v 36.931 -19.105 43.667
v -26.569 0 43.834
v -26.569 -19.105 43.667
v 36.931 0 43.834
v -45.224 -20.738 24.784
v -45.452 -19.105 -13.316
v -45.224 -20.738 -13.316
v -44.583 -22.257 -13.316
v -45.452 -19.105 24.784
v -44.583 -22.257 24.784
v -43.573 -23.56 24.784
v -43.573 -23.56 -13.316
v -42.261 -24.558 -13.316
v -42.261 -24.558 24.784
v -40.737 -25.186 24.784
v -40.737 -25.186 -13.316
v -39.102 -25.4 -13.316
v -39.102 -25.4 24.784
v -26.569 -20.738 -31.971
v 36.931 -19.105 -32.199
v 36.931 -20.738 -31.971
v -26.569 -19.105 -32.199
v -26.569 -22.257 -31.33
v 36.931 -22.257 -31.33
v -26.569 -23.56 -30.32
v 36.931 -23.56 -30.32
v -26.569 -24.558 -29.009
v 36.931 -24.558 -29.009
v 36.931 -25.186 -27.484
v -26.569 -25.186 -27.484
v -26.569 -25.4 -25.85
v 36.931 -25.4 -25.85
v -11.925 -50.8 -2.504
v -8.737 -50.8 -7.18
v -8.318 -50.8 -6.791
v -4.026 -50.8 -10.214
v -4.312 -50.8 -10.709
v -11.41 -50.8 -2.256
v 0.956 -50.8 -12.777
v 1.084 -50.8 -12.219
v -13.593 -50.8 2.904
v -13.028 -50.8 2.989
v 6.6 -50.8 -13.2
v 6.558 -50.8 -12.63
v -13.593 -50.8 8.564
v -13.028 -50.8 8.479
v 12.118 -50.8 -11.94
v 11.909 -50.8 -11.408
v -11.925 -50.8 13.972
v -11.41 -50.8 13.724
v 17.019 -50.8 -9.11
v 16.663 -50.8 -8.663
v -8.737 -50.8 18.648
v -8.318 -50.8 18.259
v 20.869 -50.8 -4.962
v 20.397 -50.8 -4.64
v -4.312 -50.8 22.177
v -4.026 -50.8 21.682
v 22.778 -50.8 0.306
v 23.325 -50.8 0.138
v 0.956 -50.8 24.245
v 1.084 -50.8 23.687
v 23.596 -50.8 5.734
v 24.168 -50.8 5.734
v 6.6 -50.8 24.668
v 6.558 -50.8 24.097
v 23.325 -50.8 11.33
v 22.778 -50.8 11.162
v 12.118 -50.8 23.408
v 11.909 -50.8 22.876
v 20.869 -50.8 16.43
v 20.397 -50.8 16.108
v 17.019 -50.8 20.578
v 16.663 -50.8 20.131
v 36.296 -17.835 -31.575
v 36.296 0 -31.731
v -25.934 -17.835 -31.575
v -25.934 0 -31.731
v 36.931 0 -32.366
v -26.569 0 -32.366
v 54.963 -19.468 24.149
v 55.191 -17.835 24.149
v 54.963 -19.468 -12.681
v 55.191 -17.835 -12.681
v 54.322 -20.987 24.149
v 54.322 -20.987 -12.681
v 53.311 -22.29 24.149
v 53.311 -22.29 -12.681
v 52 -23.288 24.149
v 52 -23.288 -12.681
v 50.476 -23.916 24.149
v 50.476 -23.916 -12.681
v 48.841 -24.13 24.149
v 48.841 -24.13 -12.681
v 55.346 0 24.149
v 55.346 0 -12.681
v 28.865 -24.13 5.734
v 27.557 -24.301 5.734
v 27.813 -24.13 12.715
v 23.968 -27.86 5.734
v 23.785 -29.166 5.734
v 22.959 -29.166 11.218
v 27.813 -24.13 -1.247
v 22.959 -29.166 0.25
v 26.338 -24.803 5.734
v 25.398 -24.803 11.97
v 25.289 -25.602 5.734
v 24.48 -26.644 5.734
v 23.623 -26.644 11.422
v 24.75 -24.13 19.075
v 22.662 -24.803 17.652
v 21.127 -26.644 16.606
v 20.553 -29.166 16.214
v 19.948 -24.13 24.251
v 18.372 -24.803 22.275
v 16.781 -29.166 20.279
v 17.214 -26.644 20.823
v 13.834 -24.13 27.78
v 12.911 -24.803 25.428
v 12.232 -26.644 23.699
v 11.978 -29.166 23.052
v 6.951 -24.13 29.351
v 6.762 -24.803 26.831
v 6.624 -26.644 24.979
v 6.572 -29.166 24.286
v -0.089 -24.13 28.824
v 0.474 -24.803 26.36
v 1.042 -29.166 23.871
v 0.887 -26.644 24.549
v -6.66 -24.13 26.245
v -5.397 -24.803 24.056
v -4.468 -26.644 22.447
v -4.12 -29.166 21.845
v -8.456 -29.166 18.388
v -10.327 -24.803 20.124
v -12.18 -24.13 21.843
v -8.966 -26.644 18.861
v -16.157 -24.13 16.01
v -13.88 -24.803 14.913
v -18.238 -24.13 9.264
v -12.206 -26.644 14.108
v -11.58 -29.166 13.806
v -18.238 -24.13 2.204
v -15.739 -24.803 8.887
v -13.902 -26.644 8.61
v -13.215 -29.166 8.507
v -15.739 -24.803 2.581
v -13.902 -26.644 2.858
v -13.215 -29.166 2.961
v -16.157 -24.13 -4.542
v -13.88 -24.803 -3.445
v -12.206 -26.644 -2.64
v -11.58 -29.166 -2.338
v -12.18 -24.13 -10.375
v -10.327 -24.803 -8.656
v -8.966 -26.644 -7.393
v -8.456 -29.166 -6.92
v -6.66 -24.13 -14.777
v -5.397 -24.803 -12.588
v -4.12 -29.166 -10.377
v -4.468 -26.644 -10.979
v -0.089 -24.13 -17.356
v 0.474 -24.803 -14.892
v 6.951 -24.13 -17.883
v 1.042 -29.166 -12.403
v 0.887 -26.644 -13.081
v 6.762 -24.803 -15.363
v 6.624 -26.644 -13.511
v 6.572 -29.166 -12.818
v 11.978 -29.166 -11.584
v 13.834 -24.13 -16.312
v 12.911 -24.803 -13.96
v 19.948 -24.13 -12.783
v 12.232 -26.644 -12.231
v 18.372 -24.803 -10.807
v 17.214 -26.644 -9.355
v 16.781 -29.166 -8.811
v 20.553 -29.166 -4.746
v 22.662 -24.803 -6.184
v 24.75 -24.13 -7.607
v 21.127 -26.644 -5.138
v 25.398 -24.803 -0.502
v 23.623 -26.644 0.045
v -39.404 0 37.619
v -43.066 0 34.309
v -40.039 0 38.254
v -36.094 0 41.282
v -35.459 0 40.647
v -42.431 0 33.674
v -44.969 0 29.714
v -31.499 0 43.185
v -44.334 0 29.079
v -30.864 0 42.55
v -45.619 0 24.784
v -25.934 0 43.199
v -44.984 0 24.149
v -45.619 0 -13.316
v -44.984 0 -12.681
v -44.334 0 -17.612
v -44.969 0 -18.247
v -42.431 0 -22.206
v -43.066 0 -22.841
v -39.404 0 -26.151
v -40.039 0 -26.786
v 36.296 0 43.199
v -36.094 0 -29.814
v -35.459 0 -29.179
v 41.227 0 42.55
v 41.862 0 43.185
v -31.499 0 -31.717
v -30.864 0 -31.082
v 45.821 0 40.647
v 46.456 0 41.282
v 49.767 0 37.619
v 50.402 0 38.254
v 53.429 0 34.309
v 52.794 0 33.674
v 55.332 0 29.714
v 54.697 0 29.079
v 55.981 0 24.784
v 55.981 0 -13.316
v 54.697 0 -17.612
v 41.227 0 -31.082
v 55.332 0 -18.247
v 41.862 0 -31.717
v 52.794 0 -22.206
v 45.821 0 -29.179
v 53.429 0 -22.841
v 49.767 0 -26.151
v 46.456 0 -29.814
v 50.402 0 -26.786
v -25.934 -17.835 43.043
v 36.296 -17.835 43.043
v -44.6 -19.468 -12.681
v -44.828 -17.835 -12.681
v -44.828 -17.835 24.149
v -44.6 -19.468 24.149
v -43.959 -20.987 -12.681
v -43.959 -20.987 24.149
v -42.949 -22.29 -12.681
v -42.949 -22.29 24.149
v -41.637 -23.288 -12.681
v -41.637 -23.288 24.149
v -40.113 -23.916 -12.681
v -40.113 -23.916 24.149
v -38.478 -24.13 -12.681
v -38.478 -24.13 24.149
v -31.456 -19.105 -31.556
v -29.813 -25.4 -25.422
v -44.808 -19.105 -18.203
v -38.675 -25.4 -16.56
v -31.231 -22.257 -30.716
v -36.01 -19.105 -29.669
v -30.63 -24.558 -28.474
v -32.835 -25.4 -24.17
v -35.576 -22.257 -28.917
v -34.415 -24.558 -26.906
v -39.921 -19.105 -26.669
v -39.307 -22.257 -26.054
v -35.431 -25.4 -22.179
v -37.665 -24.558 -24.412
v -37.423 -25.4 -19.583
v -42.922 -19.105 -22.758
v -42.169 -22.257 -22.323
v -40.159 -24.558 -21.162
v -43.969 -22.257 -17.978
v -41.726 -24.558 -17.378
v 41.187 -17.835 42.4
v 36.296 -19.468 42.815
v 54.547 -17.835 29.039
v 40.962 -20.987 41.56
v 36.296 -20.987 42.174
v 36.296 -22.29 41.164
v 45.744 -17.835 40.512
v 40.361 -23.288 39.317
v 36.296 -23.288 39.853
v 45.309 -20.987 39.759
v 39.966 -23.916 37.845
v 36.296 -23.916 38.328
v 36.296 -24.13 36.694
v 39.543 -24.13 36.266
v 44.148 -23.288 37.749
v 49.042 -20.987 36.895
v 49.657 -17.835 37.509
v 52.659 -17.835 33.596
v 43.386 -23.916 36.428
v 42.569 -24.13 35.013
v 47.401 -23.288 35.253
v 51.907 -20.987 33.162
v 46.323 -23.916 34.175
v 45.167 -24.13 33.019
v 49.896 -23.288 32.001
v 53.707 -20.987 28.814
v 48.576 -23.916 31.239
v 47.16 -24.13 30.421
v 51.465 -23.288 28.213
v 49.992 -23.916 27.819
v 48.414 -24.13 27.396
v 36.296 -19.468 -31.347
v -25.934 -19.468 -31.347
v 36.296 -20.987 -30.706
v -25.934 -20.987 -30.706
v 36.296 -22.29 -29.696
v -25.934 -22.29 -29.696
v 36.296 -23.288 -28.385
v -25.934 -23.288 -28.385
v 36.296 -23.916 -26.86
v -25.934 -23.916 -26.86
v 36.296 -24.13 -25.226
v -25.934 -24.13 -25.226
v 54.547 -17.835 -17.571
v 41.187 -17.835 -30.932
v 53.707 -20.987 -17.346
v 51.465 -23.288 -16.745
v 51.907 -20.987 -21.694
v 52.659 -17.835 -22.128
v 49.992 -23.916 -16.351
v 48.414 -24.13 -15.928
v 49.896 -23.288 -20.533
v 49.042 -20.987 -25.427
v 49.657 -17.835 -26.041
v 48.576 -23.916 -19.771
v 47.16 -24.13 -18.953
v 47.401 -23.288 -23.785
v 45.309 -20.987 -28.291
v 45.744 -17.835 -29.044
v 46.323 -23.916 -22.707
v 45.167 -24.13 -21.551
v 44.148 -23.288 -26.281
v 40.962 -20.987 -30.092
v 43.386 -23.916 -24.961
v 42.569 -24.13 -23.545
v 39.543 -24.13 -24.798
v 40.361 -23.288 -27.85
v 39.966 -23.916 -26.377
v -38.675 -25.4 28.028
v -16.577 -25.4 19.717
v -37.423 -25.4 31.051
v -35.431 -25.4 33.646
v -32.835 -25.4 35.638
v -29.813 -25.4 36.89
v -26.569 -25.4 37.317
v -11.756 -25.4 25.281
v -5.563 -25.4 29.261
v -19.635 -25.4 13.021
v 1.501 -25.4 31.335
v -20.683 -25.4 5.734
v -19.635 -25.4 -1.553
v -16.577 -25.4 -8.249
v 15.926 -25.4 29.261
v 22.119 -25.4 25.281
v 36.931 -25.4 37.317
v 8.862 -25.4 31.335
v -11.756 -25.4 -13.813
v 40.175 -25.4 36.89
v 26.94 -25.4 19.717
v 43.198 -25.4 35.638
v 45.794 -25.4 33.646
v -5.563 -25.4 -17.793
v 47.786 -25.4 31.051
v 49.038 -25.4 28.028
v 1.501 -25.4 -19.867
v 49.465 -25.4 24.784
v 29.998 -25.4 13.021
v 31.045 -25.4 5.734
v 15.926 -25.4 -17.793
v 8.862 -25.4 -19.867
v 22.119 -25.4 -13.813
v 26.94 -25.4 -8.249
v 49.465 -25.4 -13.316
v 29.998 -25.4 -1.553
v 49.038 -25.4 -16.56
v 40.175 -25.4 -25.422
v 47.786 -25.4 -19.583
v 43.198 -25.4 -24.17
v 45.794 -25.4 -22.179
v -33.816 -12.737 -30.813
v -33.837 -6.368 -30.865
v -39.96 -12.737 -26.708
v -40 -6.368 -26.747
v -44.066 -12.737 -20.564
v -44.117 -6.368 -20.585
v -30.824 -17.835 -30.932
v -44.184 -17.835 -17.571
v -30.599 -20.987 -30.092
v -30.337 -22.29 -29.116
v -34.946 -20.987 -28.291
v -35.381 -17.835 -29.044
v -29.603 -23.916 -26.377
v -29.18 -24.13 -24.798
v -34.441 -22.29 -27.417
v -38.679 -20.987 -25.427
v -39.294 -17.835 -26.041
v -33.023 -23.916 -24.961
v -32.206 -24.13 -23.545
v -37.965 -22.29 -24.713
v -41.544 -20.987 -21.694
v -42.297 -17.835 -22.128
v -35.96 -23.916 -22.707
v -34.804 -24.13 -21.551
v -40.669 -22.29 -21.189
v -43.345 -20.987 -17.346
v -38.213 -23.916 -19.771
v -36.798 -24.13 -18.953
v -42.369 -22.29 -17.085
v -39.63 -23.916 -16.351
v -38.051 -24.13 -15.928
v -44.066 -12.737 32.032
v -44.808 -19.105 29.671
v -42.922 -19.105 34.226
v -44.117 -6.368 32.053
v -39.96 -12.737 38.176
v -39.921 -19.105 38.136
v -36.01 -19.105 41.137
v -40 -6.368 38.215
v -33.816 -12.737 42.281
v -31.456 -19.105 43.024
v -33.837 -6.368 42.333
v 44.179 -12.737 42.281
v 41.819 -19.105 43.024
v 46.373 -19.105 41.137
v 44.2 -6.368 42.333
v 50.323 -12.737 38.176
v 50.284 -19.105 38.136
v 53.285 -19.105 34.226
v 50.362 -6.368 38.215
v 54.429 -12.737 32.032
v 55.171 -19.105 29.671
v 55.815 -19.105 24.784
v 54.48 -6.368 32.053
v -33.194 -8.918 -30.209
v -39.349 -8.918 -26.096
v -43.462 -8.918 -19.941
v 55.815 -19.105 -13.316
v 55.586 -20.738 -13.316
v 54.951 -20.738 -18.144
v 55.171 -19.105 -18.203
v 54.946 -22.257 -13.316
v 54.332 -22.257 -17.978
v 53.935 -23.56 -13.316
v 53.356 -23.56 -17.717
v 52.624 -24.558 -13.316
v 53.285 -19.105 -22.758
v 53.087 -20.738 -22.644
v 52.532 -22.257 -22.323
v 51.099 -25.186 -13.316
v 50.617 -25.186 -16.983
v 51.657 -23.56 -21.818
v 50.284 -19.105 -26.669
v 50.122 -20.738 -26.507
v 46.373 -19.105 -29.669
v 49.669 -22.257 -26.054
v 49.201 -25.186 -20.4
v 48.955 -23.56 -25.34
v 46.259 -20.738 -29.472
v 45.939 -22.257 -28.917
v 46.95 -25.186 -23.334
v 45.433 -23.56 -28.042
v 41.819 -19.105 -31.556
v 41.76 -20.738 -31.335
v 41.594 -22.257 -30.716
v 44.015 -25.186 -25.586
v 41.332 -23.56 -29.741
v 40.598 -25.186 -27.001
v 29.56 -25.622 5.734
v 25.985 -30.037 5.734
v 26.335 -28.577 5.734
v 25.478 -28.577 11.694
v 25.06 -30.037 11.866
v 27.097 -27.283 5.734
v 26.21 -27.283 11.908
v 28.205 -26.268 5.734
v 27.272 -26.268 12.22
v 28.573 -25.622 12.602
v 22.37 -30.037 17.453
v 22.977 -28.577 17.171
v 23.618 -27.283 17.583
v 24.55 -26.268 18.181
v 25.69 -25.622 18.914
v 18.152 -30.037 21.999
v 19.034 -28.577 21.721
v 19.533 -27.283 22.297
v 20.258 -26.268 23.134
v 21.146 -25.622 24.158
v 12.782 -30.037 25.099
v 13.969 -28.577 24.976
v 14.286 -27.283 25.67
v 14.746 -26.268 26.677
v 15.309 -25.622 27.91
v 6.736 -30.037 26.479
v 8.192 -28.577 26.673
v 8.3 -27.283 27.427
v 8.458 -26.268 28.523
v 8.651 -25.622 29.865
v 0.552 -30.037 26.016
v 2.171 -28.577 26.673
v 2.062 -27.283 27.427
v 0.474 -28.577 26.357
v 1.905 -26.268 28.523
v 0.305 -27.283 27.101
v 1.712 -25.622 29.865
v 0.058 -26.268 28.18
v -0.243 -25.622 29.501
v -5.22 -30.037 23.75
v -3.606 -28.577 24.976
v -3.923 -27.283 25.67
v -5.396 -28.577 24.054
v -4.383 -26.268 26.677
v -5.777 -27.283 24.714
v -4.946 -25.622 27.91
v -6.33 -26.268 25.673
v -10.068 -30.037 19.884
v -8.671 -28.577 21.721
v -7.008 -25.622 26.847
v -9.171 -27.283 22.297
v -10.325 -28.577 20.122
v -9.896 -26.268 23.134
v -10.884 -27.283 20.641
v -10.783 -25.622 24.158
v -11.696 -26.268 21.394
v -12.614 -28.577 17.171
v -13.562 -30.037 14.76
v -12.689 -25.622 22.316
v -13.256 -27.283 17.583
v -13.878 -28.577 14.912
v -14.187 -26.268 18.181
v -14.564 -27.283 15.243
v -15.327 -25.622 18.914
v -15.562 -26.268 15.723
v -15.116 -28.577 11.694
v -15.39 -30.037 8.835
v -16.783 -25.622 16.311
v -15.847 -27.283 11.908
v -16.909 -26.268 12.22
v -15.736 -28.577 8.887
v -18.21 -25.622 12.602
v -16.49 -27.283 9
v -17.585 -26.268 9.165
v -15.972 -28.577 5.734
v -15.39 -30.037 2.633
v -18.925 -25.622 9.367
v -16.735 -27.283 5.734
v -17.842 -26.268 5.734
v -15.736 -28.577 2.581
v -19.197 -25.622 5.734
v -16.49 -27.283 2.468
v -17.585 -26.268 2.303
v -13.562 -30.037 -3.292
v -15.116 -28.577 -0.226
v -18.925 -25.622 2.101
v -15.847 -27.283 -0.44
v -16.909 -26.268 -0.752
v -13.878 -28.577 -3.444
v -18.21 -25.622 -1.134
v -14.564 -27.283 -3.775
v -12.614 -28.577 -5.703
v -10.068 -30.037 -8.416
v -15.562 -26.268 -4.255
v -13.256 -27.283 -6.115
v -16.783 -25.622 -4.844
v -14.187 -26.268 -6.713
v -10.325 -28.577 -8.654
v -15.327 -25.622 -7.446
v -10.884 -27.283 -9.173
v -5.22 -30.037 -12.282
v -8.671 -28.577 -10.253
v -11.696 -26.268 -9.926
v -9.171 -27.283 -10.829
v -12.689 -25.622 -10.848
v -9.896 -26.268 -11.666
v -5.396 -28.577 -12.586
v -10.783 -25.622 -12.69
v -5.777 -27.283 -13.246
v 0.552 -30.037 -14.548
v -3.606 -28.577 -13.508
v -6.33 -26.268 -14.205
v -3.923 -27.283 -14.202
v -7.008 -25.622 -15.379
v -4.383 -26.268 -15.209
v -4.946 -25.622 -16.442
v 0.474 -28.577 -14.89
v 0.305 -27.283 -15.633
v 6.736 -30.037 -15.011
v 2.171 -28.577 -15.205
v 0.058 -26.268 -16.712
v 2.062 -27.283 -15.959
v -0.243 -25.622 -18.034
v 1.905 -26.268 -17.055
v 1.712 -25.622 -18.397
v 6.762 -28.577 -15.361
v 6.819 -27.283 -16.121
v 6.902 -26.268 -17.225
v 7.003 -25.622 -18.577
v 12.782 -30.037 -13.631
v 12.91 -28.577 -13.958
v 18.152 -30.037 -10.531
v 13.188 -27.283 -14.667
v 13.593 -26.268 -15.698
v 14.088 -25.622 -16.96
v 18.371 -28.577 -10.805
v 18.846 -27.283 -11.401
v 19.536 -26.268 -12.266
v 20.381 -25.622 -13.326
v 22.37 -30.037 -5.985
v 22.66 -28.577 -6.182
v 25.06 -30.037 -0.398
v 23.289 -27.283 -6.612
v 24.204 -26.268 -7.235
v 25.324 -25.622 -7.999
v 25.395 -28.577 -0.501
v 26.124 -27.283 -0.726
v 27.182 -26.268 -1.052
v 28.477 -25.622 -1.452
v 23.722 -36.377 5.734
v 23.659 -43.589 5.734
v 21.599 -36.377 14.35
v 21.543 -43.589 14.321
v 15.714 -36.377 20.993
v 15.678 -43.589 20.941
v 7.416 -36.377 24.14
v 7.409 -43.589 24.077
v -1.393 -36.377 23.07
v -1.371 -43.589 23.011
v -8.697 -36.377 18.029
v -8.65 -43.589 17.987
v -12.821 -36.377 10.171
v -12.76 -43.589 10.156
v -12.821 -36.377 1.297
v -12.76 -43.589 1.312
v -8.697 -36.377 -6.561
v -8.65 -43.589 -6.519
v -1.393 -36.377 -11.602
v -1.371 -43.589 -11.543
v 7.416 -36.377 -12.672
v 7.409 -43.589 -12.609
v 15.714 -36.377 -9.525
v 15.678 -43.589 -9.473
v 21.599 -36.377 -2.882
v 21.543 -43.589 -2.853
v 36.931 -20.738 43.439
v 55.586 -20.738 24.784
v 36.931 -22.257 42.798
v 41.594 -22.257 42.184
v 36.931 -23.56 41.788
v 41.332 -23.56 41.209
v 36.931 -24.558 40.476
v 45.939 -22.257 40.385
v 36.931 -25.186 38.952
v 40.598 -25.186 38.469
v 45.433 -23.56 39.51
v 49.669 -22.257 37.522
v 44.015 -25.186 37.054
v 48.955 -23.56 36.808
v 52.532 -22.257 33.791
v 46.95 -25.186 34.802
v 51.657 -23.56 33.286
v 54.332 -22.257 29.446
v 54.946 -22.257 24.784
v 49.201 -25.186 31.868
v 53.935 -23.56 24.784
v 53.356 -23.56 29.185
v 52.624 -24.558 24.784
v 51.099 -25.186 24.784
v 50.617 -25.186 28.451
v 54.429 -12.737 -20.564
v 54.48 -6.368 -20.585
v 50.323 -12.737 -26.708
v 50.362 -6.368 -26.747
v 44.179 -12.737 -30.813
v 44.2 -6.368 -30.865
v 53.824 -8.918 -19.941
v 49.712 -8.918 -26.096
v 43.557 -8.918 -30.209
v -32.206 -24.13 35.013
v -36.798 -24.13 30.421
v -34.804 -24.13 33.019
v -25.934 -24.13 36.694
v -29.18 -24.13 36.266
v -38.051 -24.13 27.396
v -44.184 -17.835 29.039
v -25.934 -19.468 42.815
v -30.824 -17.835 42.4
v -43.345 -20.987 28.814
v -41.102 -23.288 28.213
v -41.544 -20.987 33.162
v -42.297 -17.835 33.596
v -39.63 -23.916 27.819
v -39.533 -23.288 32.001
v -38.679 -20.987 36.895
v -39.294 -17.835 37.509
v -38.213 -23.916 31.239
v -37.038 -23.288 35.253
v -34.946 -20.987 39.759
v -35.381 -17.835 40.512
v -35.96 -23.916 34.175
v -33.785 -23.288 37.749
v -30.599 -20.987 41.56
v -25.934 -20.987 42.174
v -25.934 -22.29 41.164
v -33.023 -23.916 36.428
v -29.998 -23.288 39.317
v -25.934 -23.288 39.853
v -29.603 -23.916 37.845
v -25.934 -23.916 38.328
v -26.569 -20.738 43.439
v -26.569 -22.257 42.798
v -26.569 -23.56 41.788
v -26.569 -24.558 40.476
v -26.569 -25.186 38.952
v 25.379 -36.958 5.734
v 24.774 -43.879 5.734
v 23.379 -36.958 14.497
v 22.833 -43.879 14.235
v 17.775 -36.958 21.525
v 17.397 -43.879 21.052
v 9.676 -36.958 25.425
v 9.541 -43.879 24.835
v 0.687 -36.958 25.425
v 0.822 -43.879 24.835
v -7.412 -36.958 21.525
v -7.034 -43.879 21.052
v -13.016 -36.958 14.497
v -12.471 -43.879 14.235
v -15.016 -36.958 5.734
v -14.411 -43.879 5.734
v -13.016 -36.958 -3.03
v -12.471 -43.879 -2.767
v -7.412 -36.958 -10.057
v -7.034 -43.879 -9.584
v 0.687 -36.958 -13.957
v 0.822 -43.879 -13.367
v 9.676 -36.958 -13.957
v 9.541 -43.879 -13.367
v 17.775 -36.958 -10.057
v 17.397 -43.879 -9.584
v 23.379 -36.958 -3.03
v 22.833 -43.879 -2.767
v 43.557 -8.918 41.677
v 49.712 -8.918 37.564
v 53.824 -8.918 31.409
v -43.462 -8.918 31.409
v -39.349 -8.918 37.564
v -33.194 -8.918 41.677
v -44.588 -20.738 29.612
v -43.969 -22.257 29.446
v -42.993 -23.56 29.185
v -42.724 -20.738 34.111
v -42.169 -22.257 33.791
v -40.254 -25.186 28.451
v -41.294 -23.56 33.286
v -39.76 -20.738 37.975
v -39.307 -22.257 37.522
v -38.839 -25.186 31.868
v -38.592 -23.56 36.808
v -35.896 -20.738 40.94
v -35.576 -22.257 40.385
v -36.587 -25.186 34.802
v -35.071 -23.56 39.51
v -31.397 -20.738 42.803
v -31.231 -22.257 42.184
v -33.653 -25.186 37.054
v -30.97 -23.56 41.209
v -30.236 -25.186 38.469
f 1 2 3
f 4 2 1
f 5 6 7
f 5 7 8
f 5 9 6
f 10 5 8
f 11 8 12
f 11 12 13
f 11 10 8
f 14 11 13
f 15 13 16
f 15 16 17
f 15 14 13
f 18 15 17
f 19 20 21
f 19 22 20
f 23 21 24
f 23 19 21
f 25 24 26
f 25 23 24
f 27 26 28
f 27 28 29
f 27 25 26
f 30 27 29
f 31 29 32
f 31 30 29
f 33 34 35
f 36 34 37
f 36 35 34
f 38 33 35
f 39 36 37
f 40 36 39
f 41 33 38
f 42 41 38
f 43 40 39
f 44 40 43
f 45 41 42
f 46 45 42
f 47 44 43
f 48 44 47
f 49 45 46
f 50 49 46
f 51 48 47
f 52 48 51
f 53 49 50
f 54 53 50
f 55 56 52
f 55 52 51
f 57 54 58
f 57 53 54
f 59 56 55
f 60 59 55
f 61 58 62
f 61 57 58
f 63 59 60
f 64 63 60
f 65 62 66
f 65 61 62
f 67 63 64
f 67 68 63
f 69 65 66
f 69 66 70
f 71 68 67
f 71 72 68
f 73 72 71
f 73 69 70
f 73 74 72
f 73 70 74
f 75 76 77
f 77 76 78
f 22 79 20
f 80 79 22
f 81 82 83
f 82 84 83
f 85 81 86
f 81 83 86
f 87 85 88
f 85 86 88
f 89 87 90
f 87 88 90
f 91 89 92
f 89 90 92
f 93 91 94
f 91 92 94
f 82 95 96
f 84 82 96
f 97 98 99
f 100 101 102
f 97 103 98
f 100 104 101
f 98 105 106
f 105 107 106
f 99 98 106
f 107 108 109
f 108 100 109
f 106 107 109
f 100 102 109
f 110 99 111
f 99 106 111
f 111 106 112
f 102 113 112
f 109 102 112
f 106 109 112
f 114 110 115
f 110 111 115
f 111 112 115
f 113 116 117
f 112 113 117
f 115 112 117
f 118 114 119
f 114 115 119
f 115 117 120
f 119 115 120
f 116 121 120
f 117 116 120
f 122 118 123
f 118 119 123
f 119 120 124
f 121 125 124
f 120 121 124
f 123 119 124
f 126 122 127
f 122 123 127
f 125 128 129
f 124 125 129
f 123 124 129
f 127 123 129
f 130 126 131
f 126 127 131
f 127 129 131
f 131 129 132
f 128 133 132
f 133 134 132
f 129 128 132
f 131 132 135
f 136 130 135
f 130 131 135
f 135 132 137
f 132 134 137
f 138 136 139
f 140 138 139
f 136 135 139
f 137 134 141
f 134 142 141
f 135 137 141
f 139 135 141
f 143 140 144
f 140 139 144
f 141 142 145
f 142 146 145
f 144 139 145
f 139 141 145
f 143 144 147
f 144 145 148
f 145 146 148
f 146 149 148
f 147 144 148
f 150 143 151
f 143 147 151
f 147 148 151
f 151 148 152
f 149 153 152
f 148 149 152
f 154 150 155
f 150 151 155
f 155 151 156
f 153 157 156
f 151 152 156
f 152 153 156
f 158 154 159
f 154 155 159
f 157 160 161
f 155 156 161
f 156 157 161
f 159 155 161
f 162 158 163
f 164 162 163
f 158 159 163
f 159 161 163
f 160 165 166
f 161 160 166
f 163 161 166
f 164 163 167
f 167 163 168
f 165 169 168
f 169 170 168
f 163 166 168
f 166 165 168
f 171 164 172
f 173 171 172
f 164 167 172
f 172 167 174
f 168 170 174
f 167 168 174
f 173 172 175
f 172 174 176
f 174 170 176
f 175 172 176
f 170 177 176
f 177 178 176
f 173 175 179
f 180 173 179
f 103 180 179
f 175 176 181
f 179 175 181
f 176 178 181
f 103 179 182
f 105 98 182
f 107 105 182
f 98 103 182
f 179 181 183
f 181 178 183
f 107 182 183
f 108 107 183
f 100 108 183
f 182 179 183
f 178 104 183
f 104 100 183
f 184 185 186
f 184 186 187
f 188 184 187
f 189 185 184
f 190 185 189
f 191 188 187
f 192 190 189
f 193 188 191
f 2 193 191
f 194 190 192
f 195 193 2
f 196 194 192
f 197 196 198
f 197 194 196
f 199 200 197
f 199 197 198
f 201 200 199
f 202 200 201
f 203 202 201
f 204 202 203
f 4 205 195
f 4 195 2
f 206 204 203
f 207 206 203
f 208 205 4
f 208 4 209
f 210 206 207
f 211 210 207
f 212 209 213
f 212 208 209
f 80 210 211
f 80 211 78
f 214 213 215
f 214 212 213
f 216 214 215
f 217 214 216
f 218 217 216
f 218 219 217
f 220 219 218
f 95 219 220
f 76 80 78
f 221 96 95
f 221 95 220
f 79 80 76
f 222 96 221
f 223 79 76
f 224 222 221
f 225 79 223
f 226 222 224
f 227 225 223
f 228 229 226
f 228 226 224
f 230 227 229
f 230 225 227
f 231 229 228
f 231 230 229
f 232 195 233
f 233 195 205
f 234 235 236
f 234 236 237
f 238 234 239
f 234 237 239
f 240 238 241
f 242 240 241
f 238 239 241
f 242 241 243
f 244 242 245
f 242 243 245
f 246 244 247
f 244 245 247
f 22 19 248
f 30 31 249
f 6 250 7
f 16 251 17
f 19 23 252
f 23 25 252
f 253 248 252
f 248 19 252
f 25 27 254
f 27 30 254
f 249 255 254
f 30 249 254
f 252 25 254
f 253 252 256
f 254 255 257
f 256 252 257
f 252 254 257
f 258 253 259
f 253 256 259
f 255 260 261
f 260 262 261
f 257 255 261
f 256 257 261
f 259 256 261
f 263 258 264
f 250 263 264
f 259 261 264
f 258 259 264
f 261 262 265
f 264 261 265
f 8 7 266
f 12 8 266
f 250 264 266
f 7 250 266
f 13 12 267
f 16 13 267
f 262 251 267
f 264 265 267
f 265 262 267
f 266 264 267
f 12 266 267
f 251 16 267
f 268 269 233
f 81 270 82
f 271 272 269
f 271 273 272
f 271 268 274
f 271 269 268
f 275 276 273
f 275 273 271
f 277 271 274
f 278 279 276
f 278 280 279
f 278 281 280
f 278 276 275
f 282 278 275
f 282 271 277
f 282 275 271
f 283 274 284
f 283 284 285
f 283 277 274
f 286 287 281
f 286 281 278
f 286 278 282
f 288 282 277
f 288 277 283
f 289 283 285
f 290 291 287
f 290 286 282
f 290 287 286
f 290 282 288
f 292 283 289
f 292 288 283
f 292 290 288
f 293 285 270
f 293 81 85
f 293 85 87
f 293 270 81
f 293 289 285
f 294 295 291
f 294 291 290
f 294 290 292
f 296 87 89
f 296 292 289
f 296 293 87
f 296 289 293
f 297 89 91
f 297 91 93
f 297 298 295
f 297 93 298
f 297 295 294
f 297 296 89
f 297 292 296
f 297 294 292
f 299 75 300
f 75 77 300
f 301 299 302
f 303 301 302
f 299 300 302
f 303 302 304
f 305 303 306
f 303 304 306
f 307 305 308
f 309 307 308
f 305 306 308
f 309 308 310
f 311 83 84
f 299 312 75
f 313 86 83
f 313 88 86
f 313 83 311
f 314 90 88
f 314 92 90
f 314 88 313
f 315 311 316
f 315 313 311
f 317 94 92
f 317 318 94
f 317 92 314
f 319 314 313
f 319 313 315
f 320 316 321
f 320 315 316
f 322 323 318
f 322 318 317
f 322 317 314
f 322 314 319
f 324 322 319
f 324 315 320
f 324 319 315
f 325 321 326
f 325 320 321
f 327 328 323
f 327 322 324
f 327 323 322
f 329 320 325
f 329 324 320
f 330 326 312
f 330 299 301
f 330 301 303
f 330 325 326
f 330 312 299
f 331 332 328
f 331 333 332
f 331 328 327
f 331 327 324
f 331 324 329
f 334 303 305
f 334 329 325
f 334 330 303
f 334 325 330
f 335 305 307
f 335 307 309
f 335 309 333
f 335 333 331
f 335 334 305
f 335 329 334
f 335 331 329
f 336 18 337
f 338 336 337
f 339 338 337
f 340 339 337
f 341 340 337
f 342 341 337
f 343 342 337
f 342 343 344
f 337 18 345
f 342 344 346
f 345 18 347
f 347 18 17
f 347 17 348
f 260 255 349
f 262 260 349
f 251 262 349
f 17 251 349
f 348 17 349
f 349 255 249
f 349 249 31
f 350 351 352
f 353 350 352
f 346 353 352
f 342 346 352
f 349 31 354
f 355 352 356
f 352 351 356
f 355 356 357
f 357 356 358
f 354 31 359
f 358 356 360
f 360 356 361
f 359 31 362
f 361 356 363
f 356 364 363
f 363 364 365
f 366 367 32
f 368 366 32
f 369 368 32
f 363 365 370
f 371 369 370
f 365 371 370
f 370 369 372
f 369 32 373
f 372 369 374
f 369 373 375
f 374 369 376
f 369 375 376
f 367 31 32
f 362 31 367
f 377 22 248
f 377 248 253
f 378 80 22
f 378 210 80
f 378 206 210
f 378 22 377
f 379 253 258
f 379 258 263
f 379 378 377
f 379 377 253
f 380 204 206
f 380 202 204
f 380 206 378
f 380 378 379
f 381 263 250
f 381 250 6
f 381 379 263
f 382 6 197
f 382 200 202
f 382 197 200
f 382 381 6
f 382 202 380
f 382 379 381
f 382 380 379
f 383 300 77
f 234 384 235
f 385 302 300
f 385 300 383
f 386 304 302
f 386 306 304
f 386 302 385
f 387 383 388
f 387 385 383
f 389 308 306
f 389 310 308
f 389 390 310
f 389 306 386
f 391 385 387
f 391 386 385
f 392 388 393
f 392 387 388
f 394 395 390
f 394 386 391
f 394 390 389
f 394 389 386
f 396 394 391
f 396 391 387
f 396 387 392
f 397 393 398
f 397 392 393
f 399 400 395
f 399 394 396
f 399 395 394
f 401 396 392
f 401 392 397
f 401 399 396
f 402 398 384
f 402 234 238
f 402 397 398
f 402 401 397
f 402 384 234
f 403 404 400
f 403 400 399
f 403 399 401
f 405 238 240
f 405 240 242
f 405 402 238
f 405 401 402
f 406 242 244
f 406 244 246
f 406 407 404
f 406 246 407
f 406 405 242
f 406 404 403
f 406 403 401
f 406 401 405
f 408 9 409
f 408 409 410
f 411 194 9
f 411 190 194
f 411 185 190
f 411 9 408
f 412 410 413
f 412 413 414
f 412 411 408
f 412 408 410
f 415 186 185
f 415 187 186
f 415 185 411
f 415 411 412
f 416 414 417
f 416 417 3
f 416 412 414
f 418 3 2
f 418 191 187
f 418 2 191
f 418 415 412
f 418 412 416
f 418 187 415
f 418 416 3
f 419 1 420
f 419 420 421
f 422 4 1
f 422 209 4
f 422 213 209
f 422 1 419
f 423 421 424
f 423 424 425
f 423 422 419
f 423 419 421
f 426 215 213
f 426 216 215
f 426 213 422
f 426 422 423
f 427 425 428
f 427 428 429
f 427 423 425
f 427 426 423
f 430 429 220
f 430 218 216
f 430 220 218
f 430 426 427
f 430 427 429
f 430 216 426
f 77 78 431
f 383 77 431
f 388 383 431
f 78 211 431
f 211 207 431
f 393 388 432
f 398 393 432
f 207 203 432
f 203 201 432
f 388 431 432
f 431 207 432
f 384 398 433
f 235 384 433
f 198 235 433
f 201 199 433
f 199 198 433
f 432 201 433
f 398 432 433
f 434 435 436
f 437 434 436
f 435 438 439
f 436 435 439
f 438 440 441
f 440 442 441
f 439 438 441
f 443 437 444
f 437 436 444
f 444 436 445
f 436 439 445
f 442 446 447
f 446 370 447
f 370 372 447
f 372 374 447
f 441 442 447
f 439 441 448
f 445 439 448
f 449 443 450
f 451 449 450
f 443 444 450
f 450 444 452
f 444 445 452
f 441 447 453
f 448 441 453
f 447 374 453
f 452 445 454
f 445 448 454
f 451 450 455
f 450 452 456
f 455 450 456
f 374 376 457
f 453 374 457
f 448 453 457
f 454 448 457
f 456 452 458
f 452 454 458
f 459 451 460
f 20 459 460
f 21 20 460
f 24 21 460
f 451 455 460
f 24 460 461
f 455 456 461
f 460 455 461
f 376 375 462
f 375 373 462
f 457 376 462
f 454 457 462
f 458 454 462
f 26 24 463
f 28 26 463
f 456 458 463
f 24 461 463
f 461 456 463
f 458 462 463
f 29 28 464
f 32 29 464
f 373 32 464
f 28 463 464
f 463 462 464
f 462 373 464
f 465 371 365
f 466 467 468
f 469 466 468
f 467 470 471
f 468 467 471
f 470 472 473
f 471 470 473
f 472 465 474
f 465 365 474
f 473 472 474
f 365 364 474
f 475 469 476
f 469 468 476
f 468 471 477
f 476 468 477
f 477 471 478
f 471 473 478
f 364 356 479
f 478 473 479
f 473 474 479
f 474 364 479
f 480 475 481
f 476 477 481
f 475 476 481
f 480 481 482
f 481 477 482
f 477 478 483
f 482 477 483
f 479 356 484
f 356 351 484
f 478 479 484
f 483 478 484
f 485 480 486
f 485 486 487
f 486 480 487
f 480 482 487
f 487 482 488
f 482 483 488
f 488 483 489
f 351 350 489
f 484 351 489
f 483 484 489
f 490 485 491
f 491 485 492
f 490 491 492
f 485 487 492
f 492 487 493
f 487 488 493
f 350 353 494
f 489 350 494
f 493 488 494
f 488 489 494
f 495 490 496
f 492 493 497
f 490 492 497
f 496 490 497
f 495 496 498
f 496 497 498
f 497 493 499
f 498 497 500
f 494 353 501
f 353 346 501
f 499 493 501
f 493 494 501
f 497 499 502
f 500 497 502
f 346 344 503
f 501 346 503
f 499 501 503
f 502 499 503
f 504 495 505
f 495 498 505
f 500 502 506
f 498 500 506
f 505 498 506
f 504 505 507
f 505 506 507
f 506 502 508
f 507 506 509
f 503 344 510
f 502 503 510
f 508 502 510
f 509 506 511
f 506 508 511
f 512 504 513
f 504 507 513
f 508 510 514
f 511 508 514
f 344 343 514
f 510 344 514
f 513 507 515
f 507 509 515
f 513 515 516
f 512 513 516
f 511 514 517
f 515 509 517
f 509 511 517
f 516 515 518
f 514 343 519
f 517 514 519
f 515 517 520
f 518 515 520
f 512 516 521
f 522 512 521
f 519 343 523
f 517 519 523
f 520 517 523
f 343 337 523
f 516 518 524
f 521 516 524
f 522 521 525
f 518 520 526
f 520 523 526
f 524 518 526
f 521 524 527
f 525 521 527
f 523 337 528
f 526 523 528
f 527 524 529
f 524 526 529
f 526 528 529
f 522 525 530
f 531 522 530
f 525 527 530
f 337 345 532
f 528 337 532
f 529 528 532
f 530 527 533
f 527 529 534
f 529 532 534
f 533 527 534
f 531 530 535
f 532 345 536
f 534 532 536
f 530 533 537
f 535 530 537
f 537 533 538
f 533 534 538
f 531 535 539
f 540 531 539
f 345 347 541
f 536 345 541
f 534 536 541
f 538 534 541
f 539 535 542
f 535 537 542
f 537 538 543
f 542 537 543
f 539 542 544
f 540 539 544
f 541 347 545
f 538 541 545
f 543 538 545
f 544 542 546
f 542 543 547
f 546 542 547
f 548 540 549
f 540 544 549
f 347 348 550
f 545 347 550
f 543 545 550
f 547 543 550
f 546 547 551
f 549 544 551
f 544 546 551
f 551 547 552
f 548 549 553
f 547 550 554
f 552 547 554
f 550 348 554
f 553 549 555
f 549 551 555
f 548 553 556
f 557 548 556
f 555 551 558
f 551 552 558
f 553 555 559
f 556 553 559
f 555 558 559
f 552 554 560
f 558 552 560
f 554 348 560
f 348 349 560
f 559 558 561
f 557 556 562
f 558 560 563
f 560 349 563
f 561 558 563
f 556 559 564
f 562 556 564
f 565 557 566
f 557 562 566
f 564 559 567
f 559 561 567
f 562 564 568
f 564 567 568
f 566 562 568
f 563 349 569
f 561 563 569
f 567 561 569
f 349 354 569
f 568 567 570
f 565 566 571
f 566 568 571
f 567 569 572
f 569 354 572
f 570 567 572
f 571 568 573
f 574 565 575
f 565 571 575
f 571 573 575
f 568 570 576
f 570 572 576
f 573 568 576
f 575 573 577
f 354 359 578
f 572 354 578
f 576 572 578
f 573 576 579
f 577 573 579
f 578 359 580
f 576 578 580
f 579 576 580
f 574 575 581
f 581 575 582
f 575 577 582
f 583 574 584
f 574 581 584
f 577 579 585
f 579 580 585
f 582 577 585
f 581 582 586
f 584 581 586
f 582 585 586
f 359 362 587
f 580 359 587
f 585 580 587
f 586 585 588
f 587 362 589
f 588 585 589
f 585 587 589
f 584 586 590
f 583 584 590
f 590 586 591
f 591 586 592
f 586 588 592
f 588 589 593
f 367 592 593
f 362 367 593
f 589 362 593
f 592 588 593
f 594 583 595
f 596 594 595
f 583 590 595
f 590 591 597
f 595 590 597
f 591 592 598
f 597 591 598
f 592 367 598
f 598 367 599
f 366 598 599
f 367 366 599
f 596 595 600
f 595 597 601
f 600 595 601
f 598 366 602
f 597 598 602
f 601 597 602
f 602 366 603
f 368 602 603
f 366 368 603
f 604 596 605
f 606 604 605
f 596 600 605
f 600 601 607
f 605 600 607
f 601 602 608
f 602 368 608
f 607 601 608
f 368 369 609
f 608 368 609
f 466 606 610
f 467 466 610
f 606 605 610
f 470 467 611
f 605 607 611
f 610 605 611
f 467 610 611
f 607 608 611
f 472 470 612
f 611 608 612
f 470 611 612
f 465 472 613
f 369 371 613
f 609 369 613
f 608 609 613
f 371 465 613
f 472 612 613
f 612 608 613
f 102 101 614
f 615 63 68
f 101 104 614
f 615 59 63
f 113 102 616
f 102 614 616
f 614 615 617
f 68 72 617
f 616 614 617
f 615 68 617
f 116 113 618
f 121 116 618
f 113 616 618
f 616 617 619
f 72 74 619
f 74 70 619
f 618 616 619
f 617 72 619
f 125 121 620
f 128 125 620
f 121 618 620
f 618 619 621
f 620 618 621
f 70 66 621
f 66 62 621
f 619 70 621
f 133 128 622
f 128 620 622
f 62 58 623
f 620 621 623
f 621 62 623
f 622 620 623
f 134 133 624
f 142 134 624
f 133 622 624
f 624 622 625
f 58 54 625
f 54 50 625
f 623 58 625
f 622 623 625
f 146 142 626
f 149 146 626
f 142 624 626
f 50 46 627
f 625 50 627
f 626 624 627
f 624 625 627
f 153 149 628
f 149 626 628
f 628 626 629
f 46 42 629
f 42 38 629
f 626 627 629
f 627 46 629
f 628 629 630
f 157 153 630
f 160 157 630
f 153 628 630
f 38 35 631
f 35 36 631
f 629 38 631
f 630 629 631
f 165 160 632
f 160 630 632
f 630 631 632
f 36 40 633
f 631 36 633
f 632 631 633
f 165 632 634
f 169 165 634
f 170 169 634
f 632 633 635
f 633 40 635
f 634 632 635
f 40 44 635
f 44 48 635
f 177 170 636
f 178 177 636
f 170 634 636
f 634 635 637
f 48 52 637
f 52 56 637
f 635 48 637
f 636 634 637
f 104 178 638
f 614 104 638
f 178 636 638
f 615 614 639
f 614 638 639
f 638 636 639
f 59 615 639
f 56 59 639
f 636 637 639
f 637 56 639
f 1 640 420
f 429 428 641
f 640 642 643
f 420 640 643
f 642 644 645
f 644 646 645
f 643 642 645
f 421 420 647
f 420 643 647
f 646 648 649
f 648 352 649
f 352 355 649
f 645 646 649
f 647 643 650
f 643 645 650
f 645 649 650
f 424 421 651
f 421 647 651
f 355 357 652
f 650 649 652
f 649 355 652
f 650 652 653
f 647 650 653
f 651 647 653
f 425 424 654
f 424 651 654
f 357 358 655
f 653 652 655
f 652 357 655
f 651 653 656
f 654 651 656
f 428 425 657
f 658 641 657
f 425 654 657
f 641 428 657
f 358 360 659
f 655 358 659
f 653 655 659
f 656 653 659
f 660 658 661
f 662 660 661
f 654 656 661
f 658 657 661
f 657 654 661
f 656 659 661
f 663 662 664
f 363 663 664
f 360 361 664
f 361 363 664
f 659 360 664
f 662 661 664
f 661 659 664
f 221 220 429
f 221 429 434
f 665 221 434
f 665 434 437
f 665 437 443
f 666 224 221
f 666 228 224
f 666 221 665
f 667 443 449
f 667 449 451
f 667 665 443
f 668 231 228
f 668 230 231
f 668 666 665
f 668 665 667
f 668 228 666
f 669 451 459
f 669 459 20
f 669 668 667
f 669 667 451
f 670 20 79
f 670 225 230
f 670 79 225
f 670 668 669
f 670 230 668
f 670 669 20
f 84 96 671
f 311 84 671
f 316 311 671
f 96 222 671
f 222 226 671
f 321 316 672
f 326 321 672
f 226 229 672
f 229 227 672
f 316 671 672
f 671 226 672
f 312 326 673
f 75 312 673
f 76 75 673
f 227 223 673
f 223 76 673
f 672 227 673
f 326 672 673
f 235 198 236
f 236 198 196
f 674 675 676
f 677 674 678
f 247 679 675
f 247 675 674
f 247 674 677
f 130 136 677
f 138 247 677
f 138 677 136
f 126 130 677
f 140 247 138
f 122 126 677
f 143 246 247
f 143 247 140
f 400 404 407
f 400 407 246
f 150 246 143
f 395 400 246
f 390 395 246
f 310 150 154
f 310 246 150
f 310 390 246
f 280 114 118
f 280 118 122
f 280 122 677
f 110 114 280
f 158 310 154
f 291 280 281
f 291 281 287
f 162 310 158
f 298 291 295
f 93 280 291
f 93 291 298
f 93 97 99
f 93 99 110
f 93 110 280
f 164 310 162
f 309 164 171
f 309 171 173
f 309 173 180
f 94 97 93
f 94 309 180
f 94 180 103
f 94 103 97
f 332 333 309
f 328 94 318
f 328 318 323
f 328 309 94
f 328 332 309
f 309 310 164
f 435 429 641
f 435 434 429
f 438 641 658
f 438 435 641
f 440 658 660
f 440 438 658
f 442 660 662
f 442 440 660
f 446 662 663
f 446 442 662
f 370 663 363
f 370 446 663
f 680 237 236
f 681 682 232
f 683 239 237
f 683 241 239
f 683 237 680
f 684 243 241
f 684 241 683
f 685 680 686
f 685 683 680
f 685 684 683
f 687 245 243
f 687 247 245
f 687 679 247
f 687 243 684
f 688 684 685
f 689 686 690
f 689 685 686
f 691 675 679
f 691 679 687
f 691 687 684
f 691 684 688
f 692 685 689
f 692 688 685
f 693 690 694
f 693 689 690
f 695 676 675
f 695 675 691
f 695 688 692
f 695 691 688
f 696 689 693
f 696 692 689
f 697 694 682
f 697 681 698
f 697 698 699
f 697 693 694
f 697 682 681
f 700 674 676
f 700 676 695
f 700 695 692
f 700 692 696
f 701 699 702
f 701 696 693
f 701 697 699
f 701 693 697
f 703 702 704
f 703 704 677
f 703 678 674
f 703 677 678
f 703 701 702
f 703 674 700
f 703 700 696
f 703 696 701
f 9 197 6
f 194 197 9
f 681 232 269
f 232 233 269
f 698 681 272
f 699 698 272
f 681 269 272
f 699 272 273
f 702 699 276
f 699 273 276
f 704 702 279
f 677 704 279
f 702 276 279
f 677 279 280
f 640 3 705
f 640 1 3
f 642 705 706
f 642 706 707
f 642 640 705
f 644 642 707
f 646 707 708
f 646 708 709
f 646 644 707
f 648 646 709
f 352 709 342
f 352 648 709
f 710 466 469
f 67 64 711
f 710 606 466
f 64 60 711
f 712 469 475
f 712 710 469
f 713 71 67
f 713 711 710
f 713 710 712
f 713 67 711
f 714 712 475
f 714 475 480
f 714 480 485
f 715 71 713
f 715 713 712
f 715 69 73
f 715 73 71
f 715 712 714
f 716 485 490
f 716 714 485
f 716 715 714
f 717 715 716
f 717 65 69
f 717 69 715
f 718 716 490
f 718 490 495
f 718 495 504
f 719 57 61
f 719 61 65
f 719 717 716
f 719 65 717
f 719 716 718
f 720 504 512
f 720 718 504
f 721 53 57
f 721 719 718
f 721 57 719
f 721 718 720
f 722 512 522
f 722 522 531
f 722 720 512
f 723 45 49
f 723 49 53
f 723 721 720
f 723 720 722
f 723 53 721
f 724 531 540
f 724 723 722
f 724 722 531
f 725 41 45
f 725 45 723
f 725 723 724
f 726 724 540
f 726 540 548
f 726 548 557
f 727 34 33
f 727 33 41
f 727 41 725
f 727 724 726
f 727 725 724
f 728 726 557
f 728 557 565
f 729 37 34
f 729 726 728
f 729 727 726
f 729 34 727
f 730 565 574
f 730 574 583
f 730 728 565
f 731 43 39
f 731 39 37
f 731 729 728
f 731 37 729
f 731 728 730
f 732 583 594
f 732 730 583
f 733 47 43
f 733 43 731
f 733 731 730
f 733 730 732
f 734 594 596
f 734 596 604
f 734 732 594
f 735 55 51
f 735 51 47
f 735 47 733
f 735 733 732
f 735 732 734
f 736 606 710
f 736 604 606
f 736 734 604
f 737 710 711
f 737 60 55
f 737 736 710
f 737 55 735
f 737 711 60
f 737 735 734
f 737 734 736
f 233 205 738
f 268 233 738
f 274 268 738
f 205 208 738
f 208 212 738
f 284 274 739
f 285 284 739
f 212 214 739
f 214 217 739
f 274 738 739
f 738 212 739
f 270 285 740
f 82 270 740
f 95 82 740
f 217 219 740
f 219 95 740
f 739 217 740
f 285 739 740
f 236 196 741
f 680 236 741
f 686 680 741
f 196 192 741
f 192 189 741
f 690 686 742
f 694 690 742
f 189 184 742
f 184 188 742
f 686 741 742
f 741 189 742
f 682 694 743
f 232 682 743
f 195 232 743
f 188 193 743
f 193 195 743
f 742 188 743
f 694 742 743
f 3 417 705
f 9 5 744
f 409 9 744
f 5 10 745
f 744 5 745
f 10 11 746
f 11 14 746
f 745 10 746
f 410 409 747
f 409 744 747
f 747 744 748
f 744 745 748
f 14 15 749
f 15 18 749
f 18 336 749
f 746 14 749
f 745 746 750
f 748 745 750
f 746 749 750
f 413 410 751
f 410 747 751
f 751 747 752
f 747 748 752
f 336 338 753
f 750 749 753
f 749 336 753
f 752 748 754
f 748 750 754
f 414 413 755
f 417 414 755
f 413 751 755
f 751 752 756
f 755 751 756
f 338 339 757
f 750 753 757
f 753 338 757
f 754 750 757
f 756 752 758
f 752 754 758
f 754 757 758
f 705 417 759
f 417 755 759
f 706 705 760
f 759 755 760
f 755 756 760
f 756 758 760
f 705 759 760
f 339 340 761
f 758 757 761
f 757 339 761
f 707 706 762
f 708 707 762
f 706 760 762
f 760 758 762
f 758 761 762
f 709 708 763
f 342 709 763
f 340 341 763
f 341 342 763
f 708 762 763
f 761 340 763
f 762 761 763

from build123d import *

# Parameters (mm, degrees)
BOSS_EXTRUDE2_DEPTH = 25.4
BOSS_EXTRUDE2_DRAFT = -0.5
CUT_EXTRUDE1_DEPTH  = 24.13
CUT_EXTRUDE1_DRAFT  = -0.5
FILLET1_R           = 6.35
FILLET2_R           = 6.35
SKETCH7_R           = 21.209
BOSS_EXTRUDE3_DEPTH = 25.4
BOSS_EXTRUDE3_TAPER = 5
SKETCH11_R          = 18.415
CUT_EXTRUDE2_DEPTH  = 26.67
CUT_EXTRUDE2_DRAFT  = 0.5
FILLET3_R           = 5.08
FILLET4_R           = 5.08


with BuildPart() as part:
    # Sketch5 → Boss-Extrude2 (with draft: the straight prism first)
    with BuildSketch(Plane(origin=(0, 0, 0), x_dir=(1, 0, 0), z_dir=(0, 1, 0))):
        with BuildLine():
            ThreePointArc((-26.568599378, 32.36603099), (-40.038983559, 26.786415172), (-45.618599378, 13.31603099))
            Line((-45.618599378, 13.31603099), (-45.618599378, -24.78396901))
            ThreePointArc((-45.618599378, -24.78396901), (-40.038983559, -38.254353191), (-26.568599378, -43.83396901))
            Line((-26.568599378, -43.83396901), (36.931400622, -43.83396901))
            ThreePointArc((36.931400622, -43.83396901), (50.401784804, -38.254353191), (55.981400622, -24.78396901))
            Line((55.981400622, -24.78396901), (55.981400622, 13.31603099))
            ThreePointArc((55.981400622, 13.31603099), (50.401784804, 26.786415172), (36.931400622, 32.36603099))
            Line((36.931400622, 32.36603099), (-26.568599378, 32.36603099))
        make_face()
    extrude(amount=-BOSS_EXTRUDE2_DEPTH)
    # Boss-Extrude2: the draft: its side faces are tilted about the plane it starts from
    boss_extrude2_sides = [part.faces().sort_by_distance(p)[0] for p in [
        (-40.038983559, -12.7, -26.786415172),
        (-45.618599378, -12.7, 5.73396901),
        (-40.038983559, -12.7, 38.254353191),
        (5.181400622, -12.7, 43.83396901),
        (50.401784804, -12.7, 38.254353191),
        (55.981400622, -12.7, 5.73396901),
        (50.401784804, -12.7, -26.786415172),
        (5.181400622, -12.7, -32.36603099),
    ]]
    draft(boss_extrude2_sides, Plane(origin=(0, 0, 0), x_dir=(1, 0, 0), z_dir=(0, 1, 0)), BOSS_EXTRUDE2_DRAFT)


with BuildPart() as cut_extrude1_tool:
    # Sketch6 → Cut-Extrude1 (with draft: the straight prism first)
    with BuildSketch(Plane(origin=(0, 0, 0), x_dir=(1, 0, 0), z_dir=(0, 1, 0))):
        with BuildLine():
            ThreePointArc((-25.933599378, 31.73103099), (-39.403983559, 26.151415172), (-44.983599378, 12.68103099))
            Line((-44.983599378, 12.68103099), (-44.983599378, -24.14896901))
            ThreePointArc((-44.983599378, -24.14896901), (-39.403983559, -37.619353191), (-25.933599378, -43.19896901))
            Line((-25.933599378, -43.19896901), (36.296400622, -43.19896901))
            ThreePointArc((36.296400622, -43.19896901), (49.766784804, -37.619353191), (55.346400622, -24.14896901))
            Line((55.346400622, -24.14896901), (55.346400622, 12.68103099))
            ThreePointArc((55.346400622, 12.68103099), (49.766784804, 26.151415172), (36.296400622, 31.73103099))
            Line((36.296400622, 31.73103099), (-25.933599378, 31.73103099))
        make_face()
    extrude(amount=-CUT_EXTRUDE1_DEPTH)
    # Cut-Extrude1: the draft: its side faces are tilted about the plane it starts from
    cut_extrude1_sides = [cut_extrude1_tool.faces().sort_by_distance(p)[0] for p in [
        (-39.403983559, -12.065, -26.151415172),
        (-44.983599378, -12.065, 5.73396901),
        (-39.403983559, -12.065, 37.619353191),
        (5.181400622, -12.065, 43.19896901),
        (49.766784804, -12.065, 37.619353191),
        (55.346400622, -12.065, 5.73396901),
        (49.766784804, -12.065, -26.151415172),
        (5.181400622, -12.065, -31.73103099),
    ]]
    draft(cut_extrude1_sides, Plane(origin=(0, 0, 0), x_dir=(1, 0, 0), z_dir=(0, 1, 0)), CUT_EXTRUDE1_DRAFT)


with BuildPart() as part_1:
    add(part.part)

    # Cut-Extrude1: cut by cut_extrude1_tool
    add(cut_extrude1_tool.part, mode=Mode.SUBTRACT)

    # Fillet1
    fillet1_edges = [part_1.edges().sort_by_distance(p)[0] for p in [
        (-39.882244543, -25.4, -26.629676156),
        (-45.396936936, -25.4, 5.73396901),
        (-39.882244543, -25.4, 38.097614176),
        (5.181400622, -25.4, 43.612306568),
        (50.245045788, -25.4, 38.097614176),
        (55.759738181, -25.4, 5.73396901),
        (50.245045788, -25.4, -26.629676156),
        (5.181400622, -25.4, -32.144368548),
    ]]
    fillet(fillet1_edges, radius=FILLET1_R)

    # Fillet2
    fillet2_edges = [part_1.edges().sort_by_distance(p)[0] for p in [
        (-39.255081494, -24.13, 37.470451126),
        (-44.773020058, -24.13, 5.73396901),
        (-39.255081494, -24.13, -26.002513107),
        (5.181400622, -24.13, -31.52045167),
        (49.617882739, -24.13, -26.002513107),
        (55.135821303, -24.13, 5.73396901),
        (49.617882739, -24.13, 37.470451126),
        (5.181400622, -24.13, 42.98838969),
    ]]
    fillet(fillet2_edges, radius=FILLET2_R)

    # Sketch7 → Boss-Extrude3 (add)
    with BuildSketch(Plane.XZ.offset(25.4)):
        with Locations((5.181400622, 5.73396901)):
            Circle(SKETCH7_R)
    extrude(amount=BOSS_EXTRUDE3_DEPTH, taper=BOSS_EXTRUDE3_TAPER)


with BuildPart() as cut_extrude2_tool:
    # Sketch11 → Cut-Extrude2 (with draft: the straight prism first)
    with BuildSketch(Plane.XZ.offset(50.8)):
        with Locations((5.181400622, 5.73396901)):
            Circle(SKETCH11_R)
    extrude(amount=-CUT_EXTRUDE2_DEPTH)
    # Cut-Extrude2: the draft: its side faces are tilted about the plane it starts from
    cut_extrude2_sides = [cut_extrude2_tool.faces().sort_by_distance(p)[0] for p in [
        (-13.233599378, -37.465, 5.73396901),
    ]]
    draft(cut_extrude2_sides, Plane.XZ.offset(50.8), CUT_EXTRUDE2_DRAFT)


with BuildPart() as part_2:
    add(part_1.part)

    # Cut-Extrude2: cut by cut_extrude2_tool
    add(cut_extrude2_tool.part, mode=Mode.SUBTRACT)

    # Fillet3
    fillet3_edges = [part_2.edges().sort_by_distance(p)[0] for p in [
        (-13.466344942, -24.13, 5.73396901),
    ]]
    fillet(fillet3_edges, radius=FILLET3_R)

    # Fillet4
    fillet4_edges = [part_2.edges().sort_by_distance(p)[0] for p in [
        (-16.027599378, -25.4, 5.73396901),
    ]]
    fillet(fillet4_edges, radius=FILLET4_R)


solid = part_2.part
